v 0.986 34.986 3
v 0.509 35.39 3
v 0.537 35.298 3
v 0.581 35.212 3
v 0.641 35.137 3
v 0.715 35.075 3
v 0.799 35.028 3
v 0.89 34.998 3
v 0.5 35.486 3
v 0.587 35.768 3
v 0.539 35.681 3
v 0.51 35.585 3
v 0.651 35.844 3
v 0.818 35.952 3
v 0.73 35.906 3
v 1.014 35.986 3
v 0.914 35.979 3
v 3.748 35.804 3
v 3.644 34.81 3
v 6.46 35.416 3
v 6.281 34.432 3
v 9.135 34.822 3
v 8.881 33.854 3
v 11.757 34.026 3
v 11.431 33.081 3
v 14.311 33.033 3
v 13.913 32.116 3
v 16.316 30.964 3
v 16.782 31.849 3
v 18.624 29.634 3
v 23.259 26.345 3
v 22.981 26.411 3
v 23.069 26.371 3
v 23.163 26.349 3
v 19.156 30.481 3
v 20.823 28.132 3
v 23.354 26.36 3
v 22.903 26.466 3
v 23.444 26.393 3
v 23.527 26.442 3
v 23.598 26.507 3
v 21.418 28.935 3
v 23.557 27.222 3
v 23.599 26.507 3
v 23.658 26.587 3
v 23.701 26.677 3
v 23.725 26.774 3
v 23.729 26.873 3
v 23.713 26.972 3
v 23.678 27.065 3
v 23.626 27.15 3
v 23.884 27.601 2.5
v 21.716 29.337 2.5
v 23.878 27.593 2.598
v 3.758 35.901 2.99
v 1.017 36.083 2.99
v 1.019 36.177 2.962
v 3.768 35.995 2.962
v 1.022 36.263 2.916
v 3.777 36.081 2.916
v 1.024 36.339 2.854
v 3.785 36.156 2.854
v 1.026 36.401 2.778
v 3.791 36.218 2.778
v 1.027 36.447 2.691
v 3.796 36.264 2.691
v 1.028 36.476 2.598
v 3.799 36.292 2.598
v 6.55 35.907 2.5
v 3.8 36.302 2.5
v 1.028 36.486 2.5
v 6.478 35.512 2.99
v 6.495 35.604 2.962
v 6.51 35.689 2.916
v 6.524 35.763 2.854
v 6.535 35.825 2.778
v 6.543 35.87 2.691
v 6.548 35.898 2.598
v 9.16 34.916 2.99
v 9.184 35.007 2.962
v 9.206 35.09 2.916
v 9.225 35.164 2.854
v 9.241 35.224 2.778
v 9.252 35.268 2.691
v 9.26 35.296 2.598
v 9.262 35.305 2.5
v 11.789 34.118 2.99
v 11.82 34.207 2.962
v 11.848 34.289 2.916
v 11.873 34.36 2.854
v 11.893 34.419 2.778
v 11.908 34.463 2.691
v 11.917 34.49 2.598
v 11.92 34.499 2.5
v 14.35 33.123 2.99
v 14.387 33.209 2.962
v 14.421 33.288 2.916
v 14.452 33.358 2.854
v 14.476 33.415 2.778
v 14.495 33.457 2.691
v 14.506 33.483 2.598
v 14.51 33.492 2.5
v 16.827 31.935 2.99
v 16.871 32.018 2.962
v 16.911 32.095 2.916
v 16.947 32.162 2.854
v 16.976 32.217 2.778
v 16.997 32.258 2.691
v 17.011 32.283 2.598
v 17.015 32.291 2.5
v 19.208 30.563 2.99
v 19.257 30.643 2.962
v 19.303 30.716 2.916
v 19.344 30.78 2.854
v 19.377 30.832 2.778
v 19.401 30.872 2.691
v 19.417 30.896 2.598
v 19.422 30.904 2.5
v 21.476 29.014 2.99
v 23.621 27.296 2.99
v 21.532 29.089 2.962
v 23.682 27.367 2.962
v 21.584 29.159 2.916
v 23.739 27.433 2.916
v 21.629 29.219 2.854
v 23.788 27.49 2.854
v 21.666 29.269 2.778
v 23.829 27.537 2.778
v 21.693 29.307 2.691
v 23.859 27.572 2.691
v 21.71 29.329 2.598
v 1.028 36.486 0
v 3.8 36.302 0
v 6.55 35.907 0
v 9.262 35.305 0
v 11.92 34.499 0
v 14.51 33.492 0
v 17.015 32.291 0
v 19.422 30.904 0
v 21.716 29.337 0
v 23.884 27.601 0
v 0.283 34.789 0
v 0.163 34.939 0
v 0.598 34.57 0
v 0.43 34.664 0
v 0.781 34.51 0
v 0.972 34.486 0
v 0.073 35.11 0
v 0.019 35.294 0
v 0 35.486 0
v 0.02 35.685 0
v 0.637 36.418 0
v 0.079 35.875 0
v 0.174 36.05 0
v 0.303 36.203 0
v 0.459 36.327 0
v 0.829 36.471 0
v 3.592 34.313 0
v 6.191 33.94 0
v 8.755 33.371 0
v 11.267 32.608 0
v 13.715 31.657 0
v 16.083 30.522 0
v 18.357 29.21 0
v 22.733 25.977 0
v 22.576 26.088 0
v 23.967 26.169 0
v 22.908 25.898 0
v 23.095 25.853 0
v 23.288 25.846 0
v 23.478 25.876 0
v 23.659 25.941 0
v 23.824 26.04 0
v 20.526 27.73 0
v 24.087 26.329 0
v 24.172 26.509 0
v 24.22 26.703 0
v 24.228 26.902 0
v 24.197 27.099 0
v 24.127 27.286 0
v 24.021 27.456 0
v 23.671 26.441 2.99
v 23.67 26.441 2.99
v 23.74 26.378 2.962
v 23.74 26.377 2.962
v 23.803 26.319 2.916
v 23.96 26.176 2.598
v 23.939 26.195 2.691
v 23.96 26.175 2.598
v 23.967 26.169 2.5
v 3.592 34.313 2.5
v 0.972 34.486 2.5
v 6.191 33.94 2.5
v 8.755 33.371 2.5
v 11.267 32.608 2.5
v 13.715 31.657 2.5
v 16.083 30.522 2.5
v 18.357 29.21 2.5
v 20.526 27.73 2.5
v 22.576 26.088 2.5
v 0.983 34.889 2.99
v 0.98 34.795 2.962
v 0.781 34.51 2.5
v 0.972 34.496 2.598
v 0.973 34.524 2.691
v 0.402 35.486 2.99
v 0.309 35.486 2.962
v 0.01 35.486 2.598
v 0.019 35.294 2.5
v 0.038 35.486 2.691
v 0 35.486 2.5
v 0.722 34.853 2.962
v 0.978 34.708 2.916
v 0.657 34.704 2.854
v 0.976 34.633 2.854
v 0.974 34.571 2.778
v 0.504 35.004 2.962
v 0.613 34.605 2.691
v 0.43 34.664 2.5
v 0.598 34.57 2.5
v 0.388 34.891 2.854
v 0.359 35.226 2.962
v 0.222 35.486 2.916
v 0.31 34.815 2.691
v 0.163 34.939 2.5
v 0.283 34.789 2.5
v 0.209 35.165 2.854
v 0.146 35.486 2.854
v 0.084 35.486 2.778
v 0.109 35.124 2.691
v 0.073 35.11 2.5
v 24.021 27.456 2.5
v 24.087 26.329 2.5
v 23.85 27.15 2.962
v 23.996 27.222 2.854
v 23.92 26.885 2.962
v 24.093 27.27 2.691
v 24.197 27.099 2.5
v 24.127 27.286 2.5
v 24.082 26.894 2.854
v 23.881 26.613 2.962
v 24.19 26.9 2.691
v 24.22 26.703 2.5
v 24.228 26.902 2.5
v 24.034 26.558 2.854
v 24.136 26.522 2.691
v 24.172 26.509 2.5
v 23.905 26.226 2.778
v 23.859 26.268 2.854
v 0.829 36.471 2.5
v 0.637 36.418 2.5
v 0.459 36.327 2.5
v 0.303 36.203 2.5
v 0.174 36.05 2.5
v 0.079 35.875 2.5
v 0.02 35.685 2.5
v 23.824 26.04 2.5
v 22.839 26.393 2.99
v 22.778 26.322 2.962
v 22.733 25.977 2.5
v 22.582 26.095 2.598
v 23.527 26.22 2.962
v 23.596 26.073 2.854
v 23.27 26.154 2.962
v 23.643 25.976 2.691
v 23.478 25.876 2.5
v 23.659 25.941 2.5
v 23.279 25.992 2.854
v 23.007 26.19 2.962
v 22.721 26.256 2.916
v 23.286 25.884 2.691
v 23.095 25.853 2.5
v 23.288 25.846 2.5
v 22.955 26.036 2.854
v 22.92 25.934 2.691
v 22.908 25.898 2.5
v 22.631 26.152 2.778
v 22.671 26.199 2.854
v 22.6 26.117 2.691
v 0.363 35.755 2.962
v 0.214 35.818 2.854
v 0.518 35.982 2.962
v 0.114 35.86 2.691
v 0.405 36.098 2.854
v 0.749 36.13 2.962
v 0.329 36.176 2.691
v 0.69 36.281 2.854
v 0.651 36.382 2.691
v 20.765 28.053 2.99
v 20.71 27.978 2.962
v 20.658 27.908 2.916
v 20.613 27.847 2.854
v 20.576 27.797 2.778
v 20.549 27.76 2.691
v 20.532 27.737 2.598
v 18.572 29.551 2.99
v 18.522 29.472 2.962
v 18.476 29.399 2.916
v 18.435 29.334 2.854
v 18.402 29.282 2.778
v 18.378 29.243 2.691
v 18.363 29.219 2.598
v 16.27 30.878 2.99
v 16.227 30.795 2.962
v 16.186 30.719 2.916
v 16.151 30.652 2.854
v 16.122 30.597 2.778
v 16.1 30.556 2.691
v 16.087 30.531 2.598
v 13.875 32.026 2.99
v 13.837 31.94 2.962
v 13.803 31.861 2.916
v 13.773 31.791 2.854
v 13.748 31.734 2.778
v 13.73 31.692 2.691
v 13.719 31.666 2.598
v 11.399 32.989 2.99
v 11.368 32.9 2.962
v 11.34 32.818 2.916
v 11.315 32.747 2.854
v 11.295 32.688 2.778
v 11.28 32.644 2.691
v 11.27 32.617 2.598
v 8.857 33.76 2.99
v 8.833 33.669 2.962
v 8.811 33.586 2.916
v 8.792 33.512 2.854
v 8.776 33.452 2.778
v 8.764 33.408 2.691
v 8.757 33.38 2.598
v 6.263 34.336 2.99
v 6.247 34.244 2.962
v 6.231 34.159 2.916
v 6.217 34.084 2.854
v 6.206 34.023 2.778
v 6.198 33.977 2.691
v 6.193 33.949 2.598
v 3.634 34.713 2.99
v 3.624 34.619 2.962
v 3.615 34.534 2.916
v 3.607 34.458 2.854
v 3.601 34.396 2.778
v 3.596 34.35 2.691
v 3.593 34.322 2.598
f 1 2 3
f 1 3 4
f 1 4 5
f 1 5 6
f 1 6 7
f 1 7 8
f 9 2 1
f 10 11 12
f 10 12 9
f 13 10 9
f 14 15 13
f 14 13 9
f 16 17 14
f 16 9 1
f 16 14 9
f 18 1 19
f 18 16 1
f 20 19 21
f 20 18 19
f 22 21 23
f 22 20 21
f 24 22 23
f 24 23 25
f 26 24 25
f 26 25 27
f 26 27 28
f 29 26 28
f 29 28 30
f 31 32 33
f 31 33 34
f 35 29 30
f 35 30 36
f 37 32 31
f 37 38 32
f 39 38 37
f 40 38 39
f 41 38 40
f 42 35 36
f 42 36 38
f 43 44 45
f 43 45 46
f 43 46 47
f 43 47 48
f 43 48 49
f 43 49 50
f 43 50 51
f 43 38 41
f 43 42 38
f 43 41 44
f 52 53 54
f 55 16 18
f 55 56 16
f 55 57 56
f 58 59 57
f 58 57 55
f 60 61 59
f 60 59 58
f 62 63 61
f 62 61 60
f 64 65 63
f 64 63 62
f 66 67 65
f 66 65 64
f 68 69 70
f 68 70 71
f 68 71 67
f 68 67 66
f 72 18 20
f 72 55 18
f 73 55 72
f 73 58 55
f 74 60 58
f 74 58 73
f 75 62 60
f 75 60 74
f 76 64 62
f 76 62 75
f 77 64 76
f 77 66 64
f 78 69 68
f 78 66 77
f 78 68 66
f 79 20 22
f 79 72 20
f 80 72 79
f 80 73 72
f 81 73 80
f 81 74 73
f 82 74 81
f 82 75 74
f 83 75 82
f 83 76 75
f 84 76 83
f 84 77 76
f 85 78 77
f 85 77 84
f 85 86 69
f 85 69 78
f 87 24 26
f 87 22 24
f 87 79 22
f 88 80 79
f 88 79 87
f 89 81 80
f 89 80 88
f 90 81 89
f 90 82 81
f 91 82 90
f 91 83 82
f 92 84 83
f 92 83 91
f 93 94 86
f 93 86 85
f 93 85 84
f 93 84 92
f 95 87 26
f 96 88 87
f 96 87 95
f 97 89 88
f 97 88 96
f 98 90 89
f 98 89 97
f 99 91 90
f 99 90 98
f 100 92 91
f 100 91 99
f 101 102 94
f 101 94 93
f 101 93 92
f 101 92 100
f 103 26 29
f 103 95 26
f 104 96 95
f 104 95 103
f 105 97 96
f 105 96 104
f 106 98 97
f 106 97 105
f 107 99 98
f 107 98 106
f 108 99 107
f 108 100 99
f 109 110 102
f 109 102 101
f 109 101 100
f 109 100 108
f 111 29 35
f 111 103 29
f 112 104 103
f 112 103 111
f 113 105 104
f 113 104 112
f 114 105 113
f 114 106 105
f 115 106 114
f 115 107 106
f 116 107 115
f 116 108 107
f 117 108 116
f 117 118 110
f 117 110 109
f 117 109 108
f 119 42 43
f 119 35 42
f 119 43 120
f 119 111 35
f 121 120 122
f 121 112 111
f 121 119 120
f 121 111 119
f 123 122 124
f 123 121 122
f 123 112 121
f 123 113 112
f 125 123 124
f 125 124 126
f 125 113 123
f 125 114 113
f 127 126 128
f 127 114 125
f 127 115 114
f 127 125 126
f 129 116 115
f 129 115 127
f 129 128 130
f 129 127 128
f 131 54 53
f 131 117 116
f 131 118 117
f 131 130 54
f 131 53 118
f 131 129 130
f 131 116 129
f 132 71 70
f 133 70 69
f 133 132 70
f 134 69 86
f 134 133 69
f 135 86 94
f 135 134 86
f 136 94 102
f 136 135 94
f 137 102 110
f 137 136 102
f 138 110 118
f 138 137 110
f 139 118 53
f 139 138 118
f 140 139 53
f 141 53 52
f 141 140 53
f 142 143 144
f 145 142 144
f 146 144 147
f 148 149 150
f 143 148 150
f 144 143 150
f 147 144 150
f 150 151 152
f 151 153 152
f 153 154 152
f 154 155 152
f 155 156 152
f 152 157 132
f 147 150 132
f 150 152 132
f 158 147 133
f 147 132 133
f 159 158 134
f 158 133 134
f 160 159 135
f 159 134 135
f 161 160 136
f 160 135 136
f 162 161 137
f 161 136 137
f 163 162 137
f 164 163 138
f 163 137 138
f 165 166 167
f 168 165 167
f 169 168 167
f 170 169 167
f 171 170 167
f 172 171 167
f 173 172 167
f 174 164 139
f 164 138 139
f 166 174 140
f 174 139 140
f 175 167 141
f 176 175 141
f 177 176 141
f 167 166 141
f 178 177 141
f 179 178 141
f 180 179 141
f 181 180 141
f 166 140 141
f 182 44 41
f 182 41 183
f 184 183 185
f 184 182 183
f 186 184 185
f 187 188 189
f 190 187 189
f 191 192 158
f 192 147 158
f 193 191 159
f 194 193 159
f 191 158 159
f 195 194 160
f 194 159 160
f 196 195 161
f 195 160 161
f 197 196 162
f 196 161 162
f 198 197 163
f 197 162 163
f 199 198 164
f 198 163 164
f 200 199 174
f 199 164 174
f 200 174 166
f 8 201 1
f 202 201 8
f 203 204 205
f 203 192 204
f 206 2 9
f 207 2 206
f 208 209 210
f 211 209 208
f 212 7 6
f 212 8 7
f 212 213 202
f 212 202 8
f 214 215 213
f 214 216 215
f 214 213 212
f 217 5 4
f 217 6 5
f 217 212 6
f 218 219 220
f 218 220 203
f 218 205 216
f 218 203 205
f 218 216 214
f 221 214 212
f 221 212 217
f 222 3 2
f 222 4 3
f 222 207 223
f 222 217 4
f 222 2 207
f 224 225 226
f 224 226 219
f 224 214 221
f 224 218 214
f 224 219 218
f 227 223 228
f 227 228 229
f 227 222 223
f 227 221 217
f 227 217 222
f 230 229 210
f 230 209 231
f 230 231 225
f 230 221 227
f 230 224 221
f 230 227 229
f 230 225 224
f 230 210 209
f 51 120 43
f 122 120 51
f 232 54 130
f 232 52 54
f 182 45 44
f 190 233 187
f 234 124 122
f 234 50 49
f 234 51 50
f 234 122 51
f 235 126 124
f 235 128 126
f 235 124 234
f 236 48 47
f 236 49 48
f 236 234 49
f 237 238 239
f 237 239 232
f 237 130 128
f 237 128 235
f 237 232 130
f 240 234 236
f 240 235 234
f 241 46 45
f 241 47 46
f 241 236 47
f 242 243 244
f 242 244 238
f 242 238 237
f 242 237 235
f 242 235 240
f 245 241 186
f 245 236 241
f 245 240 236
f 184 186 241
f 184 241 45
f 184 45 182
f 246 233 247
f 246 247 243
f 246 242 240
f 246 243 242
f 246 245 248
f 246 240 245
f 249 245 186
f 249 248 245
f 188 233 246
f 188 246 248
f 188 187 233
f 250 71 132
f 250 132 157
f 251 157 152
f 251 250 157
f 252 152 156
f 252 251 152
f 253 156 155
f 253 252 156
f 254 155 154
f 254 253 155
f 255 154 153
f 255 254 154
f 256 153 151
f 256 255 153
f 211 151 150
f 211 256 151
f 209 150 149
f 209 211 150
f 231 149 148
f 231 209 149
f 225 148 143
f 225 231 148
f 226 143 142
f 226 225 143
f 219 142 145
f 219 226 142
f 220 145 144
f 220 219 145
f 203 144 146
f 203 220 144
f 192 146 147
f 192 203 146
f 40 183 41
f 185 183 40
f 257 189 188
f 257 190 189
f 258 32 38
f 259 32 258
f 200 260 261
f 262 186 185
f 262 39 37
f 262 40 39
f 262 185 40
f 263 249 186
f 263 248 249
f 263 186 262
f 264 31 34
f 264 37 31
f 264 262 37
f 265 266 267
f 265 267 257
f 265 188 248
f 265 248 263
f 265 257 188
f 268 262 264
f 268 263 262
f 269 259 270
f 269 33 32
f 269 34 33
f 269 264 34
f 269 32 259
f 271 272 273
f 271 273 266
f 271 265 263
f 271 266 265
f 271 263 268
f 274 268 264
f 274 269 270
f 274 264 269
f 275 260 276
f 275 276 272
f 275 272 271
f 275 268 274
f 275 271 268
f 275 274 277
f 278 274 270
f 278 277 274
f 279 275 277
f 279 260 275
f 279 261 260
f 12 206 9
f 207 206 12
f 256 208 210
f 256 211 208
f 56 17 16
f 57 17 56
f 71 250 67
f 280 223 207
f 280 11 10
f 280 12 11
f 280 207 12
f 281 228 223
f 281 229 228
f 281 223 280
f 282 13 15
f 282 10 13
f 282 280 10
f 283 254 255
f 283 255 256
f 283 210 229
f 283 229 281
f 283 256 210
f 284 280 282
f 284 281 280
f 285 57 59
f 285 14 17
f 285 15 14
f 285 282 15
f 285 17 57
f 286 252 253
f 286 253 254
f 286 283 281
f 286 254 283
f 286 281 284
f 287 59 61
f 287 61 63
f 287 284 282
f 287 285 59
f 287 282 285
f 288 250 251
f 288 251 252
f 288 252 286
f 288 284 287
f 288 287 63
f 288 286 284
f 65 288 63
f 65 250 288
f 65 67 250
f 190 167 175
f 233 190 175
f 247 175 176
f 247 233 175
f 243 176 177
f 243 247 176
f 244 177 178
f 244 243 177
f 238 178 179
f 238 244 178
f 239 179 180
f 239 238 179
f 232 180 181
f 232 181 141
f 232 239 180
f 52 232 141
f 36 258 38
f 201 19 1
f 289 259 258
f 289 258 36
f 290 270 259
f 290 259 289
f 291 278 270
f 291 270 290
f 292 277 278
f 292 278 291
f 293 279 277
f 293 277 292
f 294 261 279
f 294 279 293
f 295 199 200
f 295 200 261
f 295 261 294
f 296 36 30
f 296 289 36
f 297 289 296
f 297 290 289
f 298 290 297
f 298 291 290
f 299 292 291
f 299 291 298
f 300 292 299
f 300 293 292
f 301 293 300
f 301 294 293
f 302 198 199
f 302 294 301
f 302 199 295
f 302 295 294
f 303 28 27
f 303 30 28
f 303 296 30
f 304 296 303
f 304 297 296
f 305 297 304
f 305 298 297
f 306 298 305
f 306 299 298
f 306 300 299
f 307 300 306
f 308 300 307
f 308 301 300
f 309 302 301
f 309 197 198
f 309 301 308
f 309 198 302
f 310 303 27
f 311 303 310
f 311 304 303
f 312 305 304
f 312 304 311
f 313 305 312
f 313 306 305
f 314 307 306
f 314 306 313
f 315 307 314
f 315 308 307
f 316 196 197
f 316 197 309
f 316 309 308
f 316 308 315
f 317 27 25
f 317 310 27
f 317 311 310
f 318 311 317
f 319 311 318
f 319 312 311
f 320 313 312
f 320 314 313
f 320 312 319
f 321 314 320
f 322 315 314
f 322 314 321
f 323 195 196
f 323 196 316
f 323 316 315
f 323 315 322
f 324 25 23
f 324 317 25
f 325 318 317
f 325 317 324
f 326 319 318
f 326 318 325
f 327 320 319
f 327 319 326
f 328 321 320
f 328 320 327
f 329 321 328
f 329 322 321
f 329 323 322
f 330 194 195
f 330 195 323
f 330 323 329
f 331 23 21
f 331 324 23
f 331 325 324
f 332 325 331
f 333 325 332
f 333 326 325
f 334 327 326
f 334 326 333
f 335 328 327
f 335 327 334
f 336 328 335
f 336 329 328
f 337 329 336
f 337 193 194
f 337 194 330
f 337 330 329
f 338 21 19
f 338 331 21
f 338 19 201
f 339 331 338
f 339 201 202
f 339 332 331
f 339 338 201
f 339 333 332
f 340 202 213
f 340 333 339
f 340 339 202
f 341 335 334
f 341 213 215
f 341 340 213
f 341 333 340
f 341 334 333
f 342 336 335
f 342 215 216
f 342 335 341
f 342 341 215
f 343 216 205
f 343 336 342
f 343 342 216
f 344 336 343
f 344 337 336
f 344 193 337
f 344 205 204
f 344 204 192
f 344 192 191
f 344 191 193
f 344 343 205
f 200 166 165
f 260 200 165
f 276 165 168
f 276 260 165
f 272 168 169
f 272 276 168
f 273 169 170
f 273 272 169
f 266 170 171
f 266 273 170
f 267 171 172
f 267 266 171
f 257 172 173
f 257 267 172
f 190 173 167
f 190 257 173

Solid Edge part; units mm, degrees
sketch "Sketch1" plane through (0, 0, 0) normal (0, 0, 1) x (1, 0, 0)
  line L0 (0, 36.5) -> (0, 34.5)
  line L1 (23.3014, 25.442) -> (24.6522, 26.9169)
  arc A0 (24.6522, 26.9169) -> (0, 36.5) centre (0, 0) ccw
  arc A1 (0, 34.5) -> (23.3014, 25.442) centre (0, 0) cw
extrude "Protrusion1" add sketch "Sketch1" along normal blind 3
fillet "Round___Side" radius 1 4 edges at (23.3014, 25.442, 1.5) (24.6522, 26.9169, 1.5) (0, 36.5, 1.5) (0, 34.5, 1.5)
fillet "Round___Top" radius 0.5 3 edges at (12.5, 32.1559, 3) (13.2246, 34.02, 3) (0.0004, 35.5141, 3)
properties material "Silicone"
